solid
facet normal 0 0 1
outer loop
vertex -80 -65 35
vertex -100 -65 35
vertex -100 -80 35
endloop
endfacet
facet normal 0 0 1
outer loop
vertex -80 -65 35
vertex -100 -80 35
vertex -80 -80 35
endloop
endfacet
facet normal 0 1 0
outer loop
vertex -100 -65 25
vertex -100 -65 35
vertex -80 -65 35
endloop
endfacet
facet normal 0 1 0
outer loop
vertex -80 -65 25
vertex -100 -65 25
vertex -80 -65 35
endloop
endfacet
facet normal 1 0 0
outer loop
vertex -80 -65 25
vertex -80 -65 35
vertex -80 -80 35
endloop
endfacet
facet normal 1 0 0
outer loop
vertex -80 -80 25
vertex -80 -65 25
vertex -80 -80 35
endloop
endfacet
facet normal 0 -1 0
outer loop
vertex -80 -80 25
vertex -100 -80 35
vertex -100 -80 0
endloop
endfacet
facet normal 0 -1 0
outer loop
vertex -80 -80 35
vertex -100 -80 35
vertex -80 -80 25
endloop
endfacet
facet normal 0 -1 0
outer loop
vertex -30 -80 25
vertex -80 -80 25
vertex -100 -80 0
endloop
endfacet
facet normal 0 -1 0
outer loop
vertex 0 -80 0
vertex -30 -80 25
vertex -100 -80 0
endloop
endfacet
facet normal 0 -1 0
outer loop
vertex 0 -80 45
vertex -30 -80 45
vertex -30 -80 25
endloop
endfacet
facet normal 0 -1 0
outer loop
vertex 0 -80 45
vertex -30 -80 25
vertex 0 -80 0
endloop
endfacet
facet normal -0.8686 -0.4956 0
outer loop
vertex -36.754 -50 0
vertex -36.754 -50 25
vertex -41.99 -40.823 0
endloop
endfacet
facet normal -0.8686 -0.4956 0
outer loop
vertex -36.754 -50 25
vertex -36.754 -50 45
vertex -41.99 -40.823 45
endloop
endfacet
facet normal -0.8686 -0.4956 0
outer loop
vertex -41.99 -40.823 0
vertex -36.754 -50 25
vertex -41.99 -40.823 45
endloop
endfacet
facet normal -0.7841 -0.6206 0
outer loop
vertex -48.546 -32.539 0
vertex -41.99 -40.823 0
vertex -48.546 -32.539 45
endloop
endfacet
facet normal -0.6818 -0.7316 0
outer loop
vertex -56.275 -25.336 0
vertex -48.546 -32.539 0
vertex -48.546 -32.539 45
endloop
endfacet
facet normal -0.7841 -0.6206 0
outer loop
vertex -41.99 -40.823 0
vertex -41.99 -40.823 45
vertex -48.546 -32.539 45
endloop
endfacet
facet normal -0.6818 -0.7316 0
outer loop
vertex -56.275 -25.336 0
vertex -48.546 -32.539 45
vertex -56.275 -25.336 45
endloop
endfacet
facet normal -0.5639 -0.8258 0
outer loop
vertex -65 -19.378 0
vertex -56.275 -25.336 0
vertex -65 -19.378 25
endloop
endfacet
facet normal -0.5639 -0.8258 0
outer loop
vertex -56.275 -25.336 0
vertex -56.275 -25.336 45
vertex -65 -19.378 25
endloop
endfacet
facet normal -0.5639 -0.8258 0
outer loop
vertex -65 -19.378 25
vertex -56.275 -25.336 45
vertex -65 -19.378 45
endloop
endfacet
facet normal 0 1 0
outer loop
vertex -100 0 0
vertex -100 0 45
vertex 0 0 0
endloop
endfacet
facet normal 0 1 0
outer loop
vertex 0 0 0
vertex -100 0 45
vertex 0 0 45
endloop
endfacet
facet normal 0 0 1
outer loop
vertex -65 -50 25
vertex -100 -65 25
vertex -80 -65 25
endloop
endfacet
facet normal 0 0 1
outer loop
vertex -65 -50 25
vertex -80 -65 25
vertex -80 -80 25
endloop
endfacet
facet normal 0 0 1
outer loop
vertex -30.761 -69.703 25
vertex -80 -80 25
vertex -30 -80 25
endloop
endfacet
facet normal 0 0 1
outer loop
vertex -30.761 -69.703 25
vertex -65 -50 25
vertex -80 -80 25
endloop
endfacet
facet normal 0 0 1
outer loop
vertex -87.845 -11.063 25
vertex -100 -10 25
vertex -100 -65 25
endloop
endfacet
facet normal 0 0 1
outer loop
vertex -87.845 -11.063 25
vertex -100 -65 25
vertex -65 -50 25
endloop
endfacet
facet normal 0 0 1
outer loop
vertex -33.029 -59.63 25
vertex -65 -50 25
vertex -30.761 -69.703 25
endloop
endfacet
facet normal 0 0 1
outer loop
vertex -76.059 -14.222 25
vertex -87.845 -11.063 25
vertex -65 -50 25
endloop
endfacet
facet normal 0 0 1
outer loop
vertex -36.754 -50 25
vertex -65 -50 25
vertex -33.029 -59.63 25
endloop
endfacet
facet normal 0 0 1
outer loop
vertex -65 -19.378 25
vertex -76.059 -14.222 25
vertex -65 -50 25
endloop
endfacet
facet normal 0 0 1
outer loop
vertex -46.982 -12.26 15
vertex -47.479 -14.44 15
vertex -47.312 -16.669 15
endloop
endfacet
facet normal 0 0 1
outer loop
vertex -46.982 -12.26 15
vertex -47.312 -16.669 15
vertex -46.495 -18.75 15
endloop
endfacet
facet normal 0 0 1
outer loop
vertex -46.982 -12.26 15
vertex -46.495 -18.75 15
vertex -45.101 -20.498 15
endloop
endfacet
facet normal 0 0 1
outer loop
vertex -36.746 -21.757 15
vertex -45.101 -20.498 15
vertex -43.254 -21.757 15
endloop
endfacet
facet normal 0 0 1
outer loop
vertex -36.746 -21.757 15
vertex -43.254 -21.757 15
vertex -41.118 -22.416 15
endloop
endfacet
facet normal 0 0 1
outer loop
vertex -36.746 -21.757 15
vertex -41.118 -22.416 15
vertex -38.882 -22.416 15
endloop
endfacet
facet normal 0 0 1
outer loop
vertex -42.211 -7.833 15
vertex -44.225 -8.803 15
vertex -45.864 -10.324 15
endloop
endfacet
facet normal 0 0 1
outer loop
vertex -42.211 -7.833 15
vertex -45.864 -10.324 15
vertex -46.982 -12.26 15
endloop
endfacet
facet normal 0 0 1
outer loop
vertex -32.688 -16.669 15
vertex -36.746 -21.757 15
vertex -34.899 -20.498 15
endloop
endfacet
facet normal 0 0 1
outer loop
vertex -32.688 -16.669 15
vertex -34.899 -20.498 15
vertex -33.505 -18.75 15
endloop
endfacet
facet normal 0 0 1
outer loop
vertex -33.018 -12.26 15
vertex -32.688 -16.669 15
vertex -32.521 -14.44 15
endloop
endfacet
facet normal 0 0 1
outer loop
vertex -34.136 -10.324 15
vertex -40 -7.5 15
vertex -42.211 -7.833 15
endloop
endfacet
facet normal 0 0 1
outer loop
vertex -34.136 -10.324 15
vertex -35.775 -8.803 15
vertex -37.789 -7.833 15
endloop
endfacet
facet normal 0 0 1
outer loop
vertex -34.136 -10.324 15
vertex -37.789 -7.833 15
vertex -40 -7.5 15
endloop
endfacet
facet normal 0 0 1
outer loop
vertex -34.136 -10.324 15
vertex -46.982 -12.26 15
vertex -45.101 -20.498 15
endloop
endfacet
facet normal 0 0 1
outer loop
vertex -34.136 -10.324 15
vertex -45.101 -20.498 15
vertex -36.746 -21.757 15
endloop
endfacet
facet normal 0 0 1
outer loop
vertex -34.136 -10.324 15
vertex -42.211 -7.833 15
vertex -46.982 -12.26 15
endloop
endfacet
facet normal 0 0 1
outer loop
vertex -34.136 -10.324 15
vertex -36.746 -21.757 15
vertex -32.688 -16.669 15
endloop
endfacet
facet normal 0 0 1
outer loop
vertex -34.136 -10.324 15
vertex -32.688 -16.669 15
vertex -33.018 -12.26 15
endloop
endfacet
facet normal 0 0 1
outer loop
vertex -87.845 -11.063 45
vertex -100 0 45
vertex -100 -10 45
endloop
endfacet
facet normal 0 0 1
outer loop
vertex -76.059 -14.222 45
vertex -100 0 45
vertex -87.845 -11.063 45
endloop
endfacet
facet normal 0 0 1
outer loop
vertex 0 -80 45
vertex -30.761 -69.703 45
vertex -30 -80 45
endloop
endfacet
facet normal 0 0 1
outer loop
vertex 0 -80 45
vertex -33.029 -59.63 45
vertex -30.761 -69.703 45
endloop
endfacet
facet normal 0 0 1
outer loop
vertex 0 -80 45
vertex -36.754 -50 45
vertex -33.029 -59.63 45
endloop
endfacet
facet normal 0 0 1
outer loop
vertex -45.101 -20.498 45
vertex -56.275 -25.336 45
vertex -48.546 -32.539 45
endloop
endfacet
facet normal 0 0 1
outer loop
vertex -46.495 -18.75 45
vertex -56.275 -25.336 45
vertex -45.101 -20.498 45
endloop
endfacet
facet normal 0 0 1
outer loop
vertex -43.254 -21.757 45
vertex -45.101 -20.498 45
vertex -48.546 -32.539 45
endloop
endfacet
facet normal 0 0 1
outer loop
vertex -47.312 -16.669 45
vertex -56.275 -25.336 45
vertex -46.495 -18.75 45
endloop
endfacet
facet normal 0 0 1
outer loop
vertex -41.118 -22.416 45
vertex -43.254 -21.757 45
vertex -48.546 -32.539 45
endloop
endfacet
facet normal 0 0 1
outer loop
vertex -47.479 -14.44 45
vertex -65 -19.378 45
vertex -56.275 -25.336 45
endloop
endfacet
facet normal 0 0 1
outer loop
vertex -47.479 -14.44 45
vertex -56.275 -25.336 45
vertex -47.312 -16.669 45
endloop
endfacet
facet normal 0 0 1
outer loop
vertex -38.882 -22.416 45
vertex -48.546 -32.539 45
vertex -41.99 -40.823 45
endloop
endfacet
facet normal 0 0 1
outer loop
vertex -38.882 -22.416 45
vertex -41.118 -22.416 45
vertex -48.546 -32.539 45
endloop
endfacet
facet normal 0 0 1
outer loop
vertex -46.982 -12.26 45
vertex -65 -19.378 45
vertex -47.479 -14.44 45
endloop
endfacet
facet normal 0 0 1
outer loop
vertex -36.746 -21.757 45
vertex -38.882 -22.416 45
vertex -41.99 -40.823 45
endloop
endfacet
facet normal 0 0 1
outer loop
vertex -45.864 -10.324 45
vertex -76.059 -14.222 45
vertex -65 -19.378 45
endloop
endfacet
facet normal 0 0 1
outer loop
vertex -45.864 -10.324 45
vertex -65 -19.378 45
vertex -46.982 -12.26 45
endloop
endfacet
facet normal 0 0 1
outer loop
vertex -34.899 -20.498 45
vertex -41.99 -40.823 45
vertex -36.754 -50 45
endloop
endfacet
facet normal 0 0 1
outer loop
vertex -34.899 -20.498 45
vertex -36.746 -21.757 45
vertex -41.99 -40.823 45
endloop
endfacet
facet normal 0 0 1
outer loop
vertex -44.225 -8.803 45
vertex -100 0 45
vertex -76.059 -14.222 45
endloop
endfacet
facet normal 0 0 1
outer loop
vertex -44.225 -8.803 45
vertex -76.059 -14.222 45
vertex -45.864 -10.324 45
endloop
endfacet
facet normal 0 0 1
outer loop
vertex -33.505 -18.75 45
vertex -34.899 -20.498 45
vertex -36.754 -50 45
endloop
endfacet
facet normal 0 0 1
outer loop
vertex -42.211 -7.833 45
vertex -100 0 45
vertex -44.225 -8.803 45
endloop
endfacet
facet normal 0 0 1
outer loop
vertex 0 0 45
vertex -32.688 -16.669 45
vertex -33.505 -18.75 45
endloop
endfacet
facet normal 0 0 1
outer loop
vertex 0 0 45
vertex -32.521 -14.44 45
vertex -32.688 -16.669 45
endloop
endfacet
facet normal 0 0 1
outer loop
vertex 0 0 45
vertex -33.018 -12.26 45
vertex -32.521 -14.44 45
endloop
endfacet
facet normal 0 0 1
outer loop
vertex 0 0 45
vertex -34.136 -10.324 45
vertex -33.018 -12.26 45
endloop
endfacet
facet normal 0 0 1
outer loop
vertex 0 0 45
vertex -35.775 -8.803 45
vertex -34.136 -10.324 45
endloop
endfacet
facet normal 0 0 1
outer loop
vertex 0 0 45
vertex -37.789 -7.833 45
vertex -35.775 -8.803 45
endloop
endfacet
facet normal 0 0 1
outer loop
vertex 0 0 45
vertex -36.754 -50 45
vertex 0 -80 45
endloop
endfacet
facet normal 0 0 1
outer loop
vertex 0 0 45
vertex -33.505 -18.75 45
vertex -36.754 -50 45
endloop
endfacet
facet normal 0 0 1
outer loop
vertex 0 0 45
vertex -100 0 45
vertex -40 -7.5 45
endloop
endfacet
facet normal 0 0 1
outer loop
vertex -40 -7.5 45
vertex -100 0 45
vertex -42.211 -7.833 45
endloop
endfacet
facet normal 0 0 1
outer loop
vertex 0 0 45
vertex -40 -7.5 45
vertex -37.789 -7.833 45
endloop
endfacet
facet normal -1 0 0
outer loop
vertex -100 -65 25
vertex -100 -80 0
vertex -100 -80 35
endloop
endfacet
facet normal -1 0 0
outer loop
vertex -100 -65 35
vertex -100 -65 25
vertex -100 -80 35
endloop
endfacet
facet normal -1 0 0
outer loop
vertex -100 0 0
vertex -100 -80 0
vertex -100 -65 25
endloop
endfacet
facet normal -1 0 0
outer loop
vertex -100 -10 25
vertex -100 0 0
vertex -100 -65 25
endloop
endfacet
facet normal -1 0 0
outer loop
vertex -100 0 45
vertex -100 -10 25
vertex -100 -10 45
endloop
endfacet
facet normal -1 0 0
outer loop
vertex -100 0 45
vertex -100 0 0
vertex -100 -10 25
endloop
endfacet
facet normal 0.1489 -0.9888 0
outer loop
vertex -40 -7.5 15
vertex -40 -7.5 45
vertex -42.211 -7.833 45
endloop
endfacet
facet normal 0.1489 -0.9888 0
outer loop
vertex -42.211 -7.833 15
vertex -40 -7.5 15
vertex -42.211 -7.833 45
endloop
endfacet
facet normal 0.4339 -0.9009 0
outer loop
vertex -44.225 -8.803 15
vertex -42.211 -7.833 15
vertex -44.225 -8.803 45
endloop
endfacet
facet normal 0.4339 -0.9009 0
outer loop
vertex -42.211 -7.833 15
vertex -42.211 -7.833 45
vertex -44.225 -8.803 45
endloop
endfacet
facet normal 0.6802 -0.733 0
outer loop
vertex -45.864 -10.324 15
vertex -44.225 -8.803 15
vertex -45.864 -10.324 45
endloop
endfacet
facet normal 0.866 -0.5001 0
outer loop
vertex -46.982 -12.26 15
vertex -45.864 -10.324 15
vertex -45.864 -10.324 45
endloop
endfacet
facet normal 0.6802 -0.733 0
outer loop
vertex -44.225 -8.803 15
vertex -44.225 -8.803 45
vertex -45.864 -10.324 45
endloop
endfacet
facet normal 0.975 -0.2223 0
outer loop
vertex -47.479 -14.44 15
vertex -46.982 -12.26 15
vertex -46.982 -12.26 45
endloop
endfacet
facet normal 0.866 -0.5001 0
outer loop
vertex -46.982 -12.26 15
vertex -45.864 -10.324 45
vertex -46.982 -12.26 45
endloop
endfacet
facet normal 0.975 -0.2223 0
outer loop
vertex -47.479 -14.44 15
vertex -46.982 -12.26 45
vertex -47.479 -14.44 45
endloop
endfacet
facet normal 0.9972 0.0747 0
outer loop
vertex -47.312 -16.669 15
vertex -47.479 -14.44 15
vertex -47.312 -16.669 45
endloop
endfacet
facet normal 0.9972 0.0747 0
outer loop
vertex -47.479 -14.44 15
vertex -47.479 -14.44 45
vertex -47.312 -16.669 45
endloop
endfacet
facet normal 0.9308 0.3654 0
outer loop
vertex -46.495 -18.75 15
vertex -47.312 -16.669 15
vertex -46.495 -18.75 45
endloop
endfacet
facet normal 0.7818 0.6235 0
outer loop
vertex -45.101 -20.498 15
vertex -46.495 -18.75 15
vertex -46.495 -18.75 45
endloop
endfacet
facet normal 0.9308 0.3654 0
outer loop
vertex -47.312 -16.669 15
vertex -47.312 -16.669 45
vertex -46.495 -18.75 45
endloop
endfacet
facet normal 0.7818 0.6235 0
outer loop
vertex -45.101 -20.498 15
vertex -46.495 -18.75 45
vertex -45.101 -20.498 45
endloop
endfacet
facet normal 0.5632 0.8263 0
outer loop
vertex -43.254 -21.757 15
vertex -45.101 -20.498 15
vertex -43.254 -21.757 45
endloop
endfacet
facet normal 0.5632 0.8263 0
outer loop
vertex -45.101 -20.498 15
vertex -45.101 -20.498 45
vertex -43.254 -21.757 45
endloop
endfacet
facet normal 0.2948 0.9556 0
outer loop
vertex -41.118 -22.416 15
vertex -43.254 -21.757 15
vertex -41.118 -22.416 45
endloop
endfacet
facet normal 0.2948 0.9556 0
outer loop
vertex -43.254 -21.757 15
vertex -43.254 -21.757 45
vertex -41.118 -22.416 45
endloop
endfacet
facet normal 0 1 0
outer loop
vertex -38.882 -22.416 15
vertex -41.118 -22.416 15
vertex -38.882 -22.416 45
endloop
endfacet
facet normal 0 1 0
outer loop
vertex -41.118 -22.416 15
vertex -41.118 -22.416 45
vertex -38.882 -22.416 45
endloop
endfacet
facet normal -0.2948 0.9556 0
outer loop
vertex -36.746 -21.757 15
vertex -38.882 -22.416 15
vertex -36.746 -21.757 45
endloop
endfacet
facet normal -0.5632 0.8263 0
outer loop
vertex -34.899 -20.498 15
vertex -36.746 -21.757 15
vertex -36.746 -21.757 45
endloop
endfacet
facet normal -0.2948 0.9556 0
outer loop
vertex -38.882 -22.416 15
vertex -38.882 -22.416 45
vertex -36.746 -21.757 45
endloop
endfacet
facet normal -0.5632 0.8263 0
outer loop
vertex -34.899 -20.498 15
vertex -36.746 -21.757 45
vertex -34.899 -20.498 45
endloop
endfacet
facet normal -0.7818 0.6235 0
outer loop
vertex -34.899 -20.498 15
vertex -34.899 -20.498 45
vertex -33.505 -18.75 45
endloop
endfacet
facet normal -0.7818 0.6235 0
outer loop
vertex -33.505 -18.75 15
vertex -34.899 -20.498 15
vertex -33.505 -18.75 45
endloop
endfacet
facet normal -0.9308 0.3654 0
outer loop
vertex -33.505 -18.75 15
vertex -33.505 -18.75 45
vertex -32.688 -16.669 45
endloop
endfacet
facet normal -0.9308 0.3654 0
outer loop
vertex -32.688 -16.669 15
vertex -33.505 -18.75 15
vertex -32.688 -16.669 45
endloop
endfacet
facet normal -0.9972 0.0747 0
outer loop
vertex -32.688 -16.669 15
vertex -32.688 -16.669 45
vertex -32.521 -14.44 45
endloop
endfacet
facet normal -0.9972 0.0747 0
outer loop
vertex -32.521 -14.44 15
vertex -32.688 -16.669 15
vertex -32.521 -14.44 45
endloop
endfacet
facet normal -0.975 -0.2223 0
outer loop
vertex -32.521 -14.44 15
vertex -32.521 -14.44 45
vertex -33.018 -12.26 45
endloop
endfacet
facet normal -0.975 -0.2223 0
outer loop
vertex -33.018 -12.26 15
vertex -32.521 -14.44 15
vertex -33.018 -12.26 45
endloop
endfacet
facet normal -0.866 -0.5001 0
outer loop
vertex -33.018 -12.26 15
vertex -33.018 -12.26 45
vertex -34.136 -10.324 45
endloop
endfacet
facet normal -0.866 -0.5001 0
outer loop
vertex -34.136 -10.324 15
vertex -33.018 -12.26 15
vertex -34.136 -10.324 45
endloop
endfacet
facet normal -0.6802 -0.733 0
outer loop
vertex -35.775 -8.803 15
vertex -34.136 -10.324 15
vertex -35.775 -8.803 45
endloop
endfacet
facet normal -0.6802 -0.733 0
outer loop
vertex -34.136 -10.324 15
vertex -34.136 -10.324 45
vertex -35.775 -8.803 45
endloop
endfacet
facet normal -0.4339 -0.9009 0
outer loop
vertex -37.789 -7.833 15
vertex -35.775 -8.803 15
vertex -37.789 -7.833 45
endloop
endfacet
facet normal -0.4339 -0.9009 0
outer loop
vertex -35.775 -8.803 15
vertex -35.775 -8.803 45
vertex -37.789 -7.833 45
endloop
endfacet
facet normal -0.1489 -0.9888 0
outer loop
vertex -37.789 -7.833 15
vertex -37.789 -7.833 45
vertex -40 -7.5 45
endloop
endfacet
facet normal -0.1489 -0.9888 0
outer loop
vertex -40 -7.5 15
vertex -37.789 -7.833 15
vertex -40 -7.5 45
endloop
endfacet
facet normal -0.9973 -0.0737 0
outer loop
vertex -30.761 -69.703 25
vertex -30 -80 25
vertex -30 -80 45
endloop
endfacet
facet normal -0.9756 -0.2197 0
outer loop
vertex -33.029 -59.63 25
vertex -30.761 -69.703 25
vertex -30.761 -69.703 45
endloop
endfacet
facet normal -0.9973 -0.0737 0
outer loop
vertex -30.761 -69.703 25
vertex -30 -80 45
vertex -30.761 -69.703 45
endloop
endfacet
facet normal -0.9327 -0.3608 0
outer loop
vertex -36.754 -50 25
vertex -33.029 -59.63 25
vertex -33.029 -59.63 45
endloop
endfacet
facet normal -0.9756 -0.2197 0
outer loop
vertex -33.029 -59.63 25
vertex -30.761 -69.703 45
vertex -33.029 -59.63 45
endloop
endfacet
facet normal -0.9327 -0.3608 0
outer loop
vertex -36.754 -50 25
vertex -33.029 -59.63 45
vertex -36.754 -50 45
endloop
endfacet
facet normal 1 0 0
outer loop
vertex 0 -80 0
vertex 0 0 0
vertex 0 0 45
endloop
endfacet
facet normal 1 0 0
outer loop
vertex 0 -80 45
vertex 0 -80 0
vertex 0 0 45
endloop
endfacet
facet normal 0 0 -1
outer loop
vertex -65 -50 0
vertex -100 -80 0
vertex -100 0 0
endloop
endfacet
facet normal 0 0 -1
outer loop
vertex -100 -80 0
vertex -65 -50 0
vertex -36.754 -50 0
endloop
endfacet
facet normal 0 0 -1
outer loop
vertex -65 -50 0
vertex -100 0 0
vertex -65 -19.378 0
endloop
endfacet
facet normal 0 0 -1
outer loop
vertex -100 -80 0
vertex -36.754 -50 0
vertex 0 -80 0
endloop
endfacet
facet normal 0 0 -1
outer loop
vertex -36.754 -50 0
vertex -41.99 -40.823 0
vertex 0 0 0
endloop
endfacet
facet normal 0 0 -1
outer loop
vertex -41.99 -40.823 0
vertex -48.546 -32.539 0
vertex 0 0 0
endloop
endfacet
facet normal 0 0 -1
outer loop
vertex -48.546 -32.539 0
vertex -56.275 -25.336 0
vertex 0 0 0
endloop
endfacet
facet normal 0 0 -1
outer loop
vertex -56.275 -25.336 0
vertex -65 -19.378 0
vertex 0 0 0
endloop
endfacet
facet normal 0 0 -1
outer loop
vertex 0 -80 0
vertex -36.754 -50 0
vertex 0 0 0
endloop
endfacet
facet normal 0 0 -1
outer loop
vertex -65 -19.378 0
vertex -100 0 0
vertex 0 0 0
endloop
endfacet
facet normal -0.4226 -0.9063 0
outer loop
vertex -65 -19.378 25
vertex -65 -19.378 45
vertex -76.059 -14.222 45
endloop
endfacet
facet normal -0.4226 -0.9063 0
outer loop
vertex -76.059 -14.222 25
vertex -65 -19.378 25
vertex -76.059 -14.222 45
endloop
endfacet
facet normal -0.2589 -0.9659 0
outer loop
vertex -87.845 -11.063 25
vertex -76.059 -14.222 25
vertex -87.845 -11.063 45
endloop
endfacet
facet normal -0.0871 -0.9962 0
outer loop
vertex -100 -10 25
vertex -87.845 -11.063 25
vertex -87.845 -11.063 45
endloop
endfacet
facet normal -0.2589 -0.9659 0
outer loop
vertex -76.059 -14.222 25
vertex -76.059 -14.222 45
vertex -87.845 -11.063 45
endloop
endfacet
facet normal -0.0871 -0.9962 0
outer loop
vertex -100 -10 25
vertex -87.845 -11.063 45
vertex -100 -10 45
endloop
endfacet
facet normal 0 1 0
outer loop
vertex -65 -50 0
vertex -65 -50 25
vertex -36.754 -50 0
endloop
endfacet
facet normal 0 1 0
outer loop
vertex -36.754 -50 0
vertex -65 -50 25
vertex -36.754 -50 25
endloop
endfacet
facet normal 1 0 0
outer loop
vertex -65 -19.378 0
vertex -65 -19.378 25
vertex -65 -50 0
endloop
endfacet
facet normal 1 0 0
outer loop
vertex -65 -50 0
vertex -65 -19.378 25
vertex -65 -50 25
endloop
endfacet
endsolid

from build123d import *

# Parameters (mm, degrees)
F0_W     = 100
F0_H     = 45
F1_DEPTH = 80
F3_DEPTH = 30
F5_DEPTH = 45.001
F6_DEPTH = 20
F4_W     = 20
F4_H     = 15
F7_DEPTH = 10


with BuildPart() as f1:
    # F0 (on Front) → F1 (new body)
    with BuildSketch(Plane.XZ):
        with Locations((-50, 22.5)):
            Rectangle(F0_W, F0_H)
    extrude(amount=F1_DEPTH)

    # F2 (on face) → F3 (cut)
    with BuildSketch(Plane.XY.offset(45)):
        with BuildLine():
            ThreePointArc((-32.5, -15), (-34.6966991411, -9.6966991411), (-40, -7.5))
            ThreePointArc((-40, -7.5), (-45.3033008589, -20.3033008589), (-32.5, -15))
        make_face()
    extrude(amount=-F3_DEPTH, mode=Mode.SUBTRACT)

    # F4 (on face) → F5 (cut, through all)
    with BuildSketch(Plane.XY.offset(45)):
        with BuildLine():
            Line((-57.3655851185, -50), (-36.7544467966, -50))
            ThreePointArc((-36.7544467966, -50), (-48.5464237678, -32.5391793906), (-65, -19.3782217351))
            Line((-65, -19.3782217351), (-65, -49.3667125702))
            Line((-65, -49.3667125702), (-65, -50))
            Line((-65, -50), (-57.3655851185, -50))
        make_face()
    extrude(amount=-F5_DEPTH, mode=Mode.SUBTRACT)

    # F4 (on face) → F6 (cut)
    with BuildSketch(Plane.XY.offset(45)):
        with BuildLine():
            Line((-80, -80), (-30, -80))
            ThreePointArc((-30, -80), (-31.7094855627, -64.6245117839), (-36.7544467966, -50))
            Line((-36.7544467966, -50), (-57.3655851185, -50))
            Line((-57.3655851185, -50), (-65, -50))
            Line((-65, -50), (-65, -49.3667125702))
            Line((-65, -49.3667125702), (-65, -19.3782217351))
            ThreePointArc((-65, -19.3782217351), (-81.8826668428, -12.3851921598), (-100, -10))
            Line((-100, -10), (-100, -65))
            Line((-100, -65), (-80, -65))
            Line((-80, -65), (-80, -80))
        make_face()
    extrude(amount=-F6_DEPTH, mode=Mode.SUBTRACT)

    # F4 (on face) → F7 (cut)
    with BuildSketch(Plane.XY.offset(45)):
        with Locations((-90, -72.5)):
            Rectangle(F4_W, F4_H)
    extrude(amount=-F7_DEPTH, mode=Mode.SUBTRACT)


solid = f1.part
